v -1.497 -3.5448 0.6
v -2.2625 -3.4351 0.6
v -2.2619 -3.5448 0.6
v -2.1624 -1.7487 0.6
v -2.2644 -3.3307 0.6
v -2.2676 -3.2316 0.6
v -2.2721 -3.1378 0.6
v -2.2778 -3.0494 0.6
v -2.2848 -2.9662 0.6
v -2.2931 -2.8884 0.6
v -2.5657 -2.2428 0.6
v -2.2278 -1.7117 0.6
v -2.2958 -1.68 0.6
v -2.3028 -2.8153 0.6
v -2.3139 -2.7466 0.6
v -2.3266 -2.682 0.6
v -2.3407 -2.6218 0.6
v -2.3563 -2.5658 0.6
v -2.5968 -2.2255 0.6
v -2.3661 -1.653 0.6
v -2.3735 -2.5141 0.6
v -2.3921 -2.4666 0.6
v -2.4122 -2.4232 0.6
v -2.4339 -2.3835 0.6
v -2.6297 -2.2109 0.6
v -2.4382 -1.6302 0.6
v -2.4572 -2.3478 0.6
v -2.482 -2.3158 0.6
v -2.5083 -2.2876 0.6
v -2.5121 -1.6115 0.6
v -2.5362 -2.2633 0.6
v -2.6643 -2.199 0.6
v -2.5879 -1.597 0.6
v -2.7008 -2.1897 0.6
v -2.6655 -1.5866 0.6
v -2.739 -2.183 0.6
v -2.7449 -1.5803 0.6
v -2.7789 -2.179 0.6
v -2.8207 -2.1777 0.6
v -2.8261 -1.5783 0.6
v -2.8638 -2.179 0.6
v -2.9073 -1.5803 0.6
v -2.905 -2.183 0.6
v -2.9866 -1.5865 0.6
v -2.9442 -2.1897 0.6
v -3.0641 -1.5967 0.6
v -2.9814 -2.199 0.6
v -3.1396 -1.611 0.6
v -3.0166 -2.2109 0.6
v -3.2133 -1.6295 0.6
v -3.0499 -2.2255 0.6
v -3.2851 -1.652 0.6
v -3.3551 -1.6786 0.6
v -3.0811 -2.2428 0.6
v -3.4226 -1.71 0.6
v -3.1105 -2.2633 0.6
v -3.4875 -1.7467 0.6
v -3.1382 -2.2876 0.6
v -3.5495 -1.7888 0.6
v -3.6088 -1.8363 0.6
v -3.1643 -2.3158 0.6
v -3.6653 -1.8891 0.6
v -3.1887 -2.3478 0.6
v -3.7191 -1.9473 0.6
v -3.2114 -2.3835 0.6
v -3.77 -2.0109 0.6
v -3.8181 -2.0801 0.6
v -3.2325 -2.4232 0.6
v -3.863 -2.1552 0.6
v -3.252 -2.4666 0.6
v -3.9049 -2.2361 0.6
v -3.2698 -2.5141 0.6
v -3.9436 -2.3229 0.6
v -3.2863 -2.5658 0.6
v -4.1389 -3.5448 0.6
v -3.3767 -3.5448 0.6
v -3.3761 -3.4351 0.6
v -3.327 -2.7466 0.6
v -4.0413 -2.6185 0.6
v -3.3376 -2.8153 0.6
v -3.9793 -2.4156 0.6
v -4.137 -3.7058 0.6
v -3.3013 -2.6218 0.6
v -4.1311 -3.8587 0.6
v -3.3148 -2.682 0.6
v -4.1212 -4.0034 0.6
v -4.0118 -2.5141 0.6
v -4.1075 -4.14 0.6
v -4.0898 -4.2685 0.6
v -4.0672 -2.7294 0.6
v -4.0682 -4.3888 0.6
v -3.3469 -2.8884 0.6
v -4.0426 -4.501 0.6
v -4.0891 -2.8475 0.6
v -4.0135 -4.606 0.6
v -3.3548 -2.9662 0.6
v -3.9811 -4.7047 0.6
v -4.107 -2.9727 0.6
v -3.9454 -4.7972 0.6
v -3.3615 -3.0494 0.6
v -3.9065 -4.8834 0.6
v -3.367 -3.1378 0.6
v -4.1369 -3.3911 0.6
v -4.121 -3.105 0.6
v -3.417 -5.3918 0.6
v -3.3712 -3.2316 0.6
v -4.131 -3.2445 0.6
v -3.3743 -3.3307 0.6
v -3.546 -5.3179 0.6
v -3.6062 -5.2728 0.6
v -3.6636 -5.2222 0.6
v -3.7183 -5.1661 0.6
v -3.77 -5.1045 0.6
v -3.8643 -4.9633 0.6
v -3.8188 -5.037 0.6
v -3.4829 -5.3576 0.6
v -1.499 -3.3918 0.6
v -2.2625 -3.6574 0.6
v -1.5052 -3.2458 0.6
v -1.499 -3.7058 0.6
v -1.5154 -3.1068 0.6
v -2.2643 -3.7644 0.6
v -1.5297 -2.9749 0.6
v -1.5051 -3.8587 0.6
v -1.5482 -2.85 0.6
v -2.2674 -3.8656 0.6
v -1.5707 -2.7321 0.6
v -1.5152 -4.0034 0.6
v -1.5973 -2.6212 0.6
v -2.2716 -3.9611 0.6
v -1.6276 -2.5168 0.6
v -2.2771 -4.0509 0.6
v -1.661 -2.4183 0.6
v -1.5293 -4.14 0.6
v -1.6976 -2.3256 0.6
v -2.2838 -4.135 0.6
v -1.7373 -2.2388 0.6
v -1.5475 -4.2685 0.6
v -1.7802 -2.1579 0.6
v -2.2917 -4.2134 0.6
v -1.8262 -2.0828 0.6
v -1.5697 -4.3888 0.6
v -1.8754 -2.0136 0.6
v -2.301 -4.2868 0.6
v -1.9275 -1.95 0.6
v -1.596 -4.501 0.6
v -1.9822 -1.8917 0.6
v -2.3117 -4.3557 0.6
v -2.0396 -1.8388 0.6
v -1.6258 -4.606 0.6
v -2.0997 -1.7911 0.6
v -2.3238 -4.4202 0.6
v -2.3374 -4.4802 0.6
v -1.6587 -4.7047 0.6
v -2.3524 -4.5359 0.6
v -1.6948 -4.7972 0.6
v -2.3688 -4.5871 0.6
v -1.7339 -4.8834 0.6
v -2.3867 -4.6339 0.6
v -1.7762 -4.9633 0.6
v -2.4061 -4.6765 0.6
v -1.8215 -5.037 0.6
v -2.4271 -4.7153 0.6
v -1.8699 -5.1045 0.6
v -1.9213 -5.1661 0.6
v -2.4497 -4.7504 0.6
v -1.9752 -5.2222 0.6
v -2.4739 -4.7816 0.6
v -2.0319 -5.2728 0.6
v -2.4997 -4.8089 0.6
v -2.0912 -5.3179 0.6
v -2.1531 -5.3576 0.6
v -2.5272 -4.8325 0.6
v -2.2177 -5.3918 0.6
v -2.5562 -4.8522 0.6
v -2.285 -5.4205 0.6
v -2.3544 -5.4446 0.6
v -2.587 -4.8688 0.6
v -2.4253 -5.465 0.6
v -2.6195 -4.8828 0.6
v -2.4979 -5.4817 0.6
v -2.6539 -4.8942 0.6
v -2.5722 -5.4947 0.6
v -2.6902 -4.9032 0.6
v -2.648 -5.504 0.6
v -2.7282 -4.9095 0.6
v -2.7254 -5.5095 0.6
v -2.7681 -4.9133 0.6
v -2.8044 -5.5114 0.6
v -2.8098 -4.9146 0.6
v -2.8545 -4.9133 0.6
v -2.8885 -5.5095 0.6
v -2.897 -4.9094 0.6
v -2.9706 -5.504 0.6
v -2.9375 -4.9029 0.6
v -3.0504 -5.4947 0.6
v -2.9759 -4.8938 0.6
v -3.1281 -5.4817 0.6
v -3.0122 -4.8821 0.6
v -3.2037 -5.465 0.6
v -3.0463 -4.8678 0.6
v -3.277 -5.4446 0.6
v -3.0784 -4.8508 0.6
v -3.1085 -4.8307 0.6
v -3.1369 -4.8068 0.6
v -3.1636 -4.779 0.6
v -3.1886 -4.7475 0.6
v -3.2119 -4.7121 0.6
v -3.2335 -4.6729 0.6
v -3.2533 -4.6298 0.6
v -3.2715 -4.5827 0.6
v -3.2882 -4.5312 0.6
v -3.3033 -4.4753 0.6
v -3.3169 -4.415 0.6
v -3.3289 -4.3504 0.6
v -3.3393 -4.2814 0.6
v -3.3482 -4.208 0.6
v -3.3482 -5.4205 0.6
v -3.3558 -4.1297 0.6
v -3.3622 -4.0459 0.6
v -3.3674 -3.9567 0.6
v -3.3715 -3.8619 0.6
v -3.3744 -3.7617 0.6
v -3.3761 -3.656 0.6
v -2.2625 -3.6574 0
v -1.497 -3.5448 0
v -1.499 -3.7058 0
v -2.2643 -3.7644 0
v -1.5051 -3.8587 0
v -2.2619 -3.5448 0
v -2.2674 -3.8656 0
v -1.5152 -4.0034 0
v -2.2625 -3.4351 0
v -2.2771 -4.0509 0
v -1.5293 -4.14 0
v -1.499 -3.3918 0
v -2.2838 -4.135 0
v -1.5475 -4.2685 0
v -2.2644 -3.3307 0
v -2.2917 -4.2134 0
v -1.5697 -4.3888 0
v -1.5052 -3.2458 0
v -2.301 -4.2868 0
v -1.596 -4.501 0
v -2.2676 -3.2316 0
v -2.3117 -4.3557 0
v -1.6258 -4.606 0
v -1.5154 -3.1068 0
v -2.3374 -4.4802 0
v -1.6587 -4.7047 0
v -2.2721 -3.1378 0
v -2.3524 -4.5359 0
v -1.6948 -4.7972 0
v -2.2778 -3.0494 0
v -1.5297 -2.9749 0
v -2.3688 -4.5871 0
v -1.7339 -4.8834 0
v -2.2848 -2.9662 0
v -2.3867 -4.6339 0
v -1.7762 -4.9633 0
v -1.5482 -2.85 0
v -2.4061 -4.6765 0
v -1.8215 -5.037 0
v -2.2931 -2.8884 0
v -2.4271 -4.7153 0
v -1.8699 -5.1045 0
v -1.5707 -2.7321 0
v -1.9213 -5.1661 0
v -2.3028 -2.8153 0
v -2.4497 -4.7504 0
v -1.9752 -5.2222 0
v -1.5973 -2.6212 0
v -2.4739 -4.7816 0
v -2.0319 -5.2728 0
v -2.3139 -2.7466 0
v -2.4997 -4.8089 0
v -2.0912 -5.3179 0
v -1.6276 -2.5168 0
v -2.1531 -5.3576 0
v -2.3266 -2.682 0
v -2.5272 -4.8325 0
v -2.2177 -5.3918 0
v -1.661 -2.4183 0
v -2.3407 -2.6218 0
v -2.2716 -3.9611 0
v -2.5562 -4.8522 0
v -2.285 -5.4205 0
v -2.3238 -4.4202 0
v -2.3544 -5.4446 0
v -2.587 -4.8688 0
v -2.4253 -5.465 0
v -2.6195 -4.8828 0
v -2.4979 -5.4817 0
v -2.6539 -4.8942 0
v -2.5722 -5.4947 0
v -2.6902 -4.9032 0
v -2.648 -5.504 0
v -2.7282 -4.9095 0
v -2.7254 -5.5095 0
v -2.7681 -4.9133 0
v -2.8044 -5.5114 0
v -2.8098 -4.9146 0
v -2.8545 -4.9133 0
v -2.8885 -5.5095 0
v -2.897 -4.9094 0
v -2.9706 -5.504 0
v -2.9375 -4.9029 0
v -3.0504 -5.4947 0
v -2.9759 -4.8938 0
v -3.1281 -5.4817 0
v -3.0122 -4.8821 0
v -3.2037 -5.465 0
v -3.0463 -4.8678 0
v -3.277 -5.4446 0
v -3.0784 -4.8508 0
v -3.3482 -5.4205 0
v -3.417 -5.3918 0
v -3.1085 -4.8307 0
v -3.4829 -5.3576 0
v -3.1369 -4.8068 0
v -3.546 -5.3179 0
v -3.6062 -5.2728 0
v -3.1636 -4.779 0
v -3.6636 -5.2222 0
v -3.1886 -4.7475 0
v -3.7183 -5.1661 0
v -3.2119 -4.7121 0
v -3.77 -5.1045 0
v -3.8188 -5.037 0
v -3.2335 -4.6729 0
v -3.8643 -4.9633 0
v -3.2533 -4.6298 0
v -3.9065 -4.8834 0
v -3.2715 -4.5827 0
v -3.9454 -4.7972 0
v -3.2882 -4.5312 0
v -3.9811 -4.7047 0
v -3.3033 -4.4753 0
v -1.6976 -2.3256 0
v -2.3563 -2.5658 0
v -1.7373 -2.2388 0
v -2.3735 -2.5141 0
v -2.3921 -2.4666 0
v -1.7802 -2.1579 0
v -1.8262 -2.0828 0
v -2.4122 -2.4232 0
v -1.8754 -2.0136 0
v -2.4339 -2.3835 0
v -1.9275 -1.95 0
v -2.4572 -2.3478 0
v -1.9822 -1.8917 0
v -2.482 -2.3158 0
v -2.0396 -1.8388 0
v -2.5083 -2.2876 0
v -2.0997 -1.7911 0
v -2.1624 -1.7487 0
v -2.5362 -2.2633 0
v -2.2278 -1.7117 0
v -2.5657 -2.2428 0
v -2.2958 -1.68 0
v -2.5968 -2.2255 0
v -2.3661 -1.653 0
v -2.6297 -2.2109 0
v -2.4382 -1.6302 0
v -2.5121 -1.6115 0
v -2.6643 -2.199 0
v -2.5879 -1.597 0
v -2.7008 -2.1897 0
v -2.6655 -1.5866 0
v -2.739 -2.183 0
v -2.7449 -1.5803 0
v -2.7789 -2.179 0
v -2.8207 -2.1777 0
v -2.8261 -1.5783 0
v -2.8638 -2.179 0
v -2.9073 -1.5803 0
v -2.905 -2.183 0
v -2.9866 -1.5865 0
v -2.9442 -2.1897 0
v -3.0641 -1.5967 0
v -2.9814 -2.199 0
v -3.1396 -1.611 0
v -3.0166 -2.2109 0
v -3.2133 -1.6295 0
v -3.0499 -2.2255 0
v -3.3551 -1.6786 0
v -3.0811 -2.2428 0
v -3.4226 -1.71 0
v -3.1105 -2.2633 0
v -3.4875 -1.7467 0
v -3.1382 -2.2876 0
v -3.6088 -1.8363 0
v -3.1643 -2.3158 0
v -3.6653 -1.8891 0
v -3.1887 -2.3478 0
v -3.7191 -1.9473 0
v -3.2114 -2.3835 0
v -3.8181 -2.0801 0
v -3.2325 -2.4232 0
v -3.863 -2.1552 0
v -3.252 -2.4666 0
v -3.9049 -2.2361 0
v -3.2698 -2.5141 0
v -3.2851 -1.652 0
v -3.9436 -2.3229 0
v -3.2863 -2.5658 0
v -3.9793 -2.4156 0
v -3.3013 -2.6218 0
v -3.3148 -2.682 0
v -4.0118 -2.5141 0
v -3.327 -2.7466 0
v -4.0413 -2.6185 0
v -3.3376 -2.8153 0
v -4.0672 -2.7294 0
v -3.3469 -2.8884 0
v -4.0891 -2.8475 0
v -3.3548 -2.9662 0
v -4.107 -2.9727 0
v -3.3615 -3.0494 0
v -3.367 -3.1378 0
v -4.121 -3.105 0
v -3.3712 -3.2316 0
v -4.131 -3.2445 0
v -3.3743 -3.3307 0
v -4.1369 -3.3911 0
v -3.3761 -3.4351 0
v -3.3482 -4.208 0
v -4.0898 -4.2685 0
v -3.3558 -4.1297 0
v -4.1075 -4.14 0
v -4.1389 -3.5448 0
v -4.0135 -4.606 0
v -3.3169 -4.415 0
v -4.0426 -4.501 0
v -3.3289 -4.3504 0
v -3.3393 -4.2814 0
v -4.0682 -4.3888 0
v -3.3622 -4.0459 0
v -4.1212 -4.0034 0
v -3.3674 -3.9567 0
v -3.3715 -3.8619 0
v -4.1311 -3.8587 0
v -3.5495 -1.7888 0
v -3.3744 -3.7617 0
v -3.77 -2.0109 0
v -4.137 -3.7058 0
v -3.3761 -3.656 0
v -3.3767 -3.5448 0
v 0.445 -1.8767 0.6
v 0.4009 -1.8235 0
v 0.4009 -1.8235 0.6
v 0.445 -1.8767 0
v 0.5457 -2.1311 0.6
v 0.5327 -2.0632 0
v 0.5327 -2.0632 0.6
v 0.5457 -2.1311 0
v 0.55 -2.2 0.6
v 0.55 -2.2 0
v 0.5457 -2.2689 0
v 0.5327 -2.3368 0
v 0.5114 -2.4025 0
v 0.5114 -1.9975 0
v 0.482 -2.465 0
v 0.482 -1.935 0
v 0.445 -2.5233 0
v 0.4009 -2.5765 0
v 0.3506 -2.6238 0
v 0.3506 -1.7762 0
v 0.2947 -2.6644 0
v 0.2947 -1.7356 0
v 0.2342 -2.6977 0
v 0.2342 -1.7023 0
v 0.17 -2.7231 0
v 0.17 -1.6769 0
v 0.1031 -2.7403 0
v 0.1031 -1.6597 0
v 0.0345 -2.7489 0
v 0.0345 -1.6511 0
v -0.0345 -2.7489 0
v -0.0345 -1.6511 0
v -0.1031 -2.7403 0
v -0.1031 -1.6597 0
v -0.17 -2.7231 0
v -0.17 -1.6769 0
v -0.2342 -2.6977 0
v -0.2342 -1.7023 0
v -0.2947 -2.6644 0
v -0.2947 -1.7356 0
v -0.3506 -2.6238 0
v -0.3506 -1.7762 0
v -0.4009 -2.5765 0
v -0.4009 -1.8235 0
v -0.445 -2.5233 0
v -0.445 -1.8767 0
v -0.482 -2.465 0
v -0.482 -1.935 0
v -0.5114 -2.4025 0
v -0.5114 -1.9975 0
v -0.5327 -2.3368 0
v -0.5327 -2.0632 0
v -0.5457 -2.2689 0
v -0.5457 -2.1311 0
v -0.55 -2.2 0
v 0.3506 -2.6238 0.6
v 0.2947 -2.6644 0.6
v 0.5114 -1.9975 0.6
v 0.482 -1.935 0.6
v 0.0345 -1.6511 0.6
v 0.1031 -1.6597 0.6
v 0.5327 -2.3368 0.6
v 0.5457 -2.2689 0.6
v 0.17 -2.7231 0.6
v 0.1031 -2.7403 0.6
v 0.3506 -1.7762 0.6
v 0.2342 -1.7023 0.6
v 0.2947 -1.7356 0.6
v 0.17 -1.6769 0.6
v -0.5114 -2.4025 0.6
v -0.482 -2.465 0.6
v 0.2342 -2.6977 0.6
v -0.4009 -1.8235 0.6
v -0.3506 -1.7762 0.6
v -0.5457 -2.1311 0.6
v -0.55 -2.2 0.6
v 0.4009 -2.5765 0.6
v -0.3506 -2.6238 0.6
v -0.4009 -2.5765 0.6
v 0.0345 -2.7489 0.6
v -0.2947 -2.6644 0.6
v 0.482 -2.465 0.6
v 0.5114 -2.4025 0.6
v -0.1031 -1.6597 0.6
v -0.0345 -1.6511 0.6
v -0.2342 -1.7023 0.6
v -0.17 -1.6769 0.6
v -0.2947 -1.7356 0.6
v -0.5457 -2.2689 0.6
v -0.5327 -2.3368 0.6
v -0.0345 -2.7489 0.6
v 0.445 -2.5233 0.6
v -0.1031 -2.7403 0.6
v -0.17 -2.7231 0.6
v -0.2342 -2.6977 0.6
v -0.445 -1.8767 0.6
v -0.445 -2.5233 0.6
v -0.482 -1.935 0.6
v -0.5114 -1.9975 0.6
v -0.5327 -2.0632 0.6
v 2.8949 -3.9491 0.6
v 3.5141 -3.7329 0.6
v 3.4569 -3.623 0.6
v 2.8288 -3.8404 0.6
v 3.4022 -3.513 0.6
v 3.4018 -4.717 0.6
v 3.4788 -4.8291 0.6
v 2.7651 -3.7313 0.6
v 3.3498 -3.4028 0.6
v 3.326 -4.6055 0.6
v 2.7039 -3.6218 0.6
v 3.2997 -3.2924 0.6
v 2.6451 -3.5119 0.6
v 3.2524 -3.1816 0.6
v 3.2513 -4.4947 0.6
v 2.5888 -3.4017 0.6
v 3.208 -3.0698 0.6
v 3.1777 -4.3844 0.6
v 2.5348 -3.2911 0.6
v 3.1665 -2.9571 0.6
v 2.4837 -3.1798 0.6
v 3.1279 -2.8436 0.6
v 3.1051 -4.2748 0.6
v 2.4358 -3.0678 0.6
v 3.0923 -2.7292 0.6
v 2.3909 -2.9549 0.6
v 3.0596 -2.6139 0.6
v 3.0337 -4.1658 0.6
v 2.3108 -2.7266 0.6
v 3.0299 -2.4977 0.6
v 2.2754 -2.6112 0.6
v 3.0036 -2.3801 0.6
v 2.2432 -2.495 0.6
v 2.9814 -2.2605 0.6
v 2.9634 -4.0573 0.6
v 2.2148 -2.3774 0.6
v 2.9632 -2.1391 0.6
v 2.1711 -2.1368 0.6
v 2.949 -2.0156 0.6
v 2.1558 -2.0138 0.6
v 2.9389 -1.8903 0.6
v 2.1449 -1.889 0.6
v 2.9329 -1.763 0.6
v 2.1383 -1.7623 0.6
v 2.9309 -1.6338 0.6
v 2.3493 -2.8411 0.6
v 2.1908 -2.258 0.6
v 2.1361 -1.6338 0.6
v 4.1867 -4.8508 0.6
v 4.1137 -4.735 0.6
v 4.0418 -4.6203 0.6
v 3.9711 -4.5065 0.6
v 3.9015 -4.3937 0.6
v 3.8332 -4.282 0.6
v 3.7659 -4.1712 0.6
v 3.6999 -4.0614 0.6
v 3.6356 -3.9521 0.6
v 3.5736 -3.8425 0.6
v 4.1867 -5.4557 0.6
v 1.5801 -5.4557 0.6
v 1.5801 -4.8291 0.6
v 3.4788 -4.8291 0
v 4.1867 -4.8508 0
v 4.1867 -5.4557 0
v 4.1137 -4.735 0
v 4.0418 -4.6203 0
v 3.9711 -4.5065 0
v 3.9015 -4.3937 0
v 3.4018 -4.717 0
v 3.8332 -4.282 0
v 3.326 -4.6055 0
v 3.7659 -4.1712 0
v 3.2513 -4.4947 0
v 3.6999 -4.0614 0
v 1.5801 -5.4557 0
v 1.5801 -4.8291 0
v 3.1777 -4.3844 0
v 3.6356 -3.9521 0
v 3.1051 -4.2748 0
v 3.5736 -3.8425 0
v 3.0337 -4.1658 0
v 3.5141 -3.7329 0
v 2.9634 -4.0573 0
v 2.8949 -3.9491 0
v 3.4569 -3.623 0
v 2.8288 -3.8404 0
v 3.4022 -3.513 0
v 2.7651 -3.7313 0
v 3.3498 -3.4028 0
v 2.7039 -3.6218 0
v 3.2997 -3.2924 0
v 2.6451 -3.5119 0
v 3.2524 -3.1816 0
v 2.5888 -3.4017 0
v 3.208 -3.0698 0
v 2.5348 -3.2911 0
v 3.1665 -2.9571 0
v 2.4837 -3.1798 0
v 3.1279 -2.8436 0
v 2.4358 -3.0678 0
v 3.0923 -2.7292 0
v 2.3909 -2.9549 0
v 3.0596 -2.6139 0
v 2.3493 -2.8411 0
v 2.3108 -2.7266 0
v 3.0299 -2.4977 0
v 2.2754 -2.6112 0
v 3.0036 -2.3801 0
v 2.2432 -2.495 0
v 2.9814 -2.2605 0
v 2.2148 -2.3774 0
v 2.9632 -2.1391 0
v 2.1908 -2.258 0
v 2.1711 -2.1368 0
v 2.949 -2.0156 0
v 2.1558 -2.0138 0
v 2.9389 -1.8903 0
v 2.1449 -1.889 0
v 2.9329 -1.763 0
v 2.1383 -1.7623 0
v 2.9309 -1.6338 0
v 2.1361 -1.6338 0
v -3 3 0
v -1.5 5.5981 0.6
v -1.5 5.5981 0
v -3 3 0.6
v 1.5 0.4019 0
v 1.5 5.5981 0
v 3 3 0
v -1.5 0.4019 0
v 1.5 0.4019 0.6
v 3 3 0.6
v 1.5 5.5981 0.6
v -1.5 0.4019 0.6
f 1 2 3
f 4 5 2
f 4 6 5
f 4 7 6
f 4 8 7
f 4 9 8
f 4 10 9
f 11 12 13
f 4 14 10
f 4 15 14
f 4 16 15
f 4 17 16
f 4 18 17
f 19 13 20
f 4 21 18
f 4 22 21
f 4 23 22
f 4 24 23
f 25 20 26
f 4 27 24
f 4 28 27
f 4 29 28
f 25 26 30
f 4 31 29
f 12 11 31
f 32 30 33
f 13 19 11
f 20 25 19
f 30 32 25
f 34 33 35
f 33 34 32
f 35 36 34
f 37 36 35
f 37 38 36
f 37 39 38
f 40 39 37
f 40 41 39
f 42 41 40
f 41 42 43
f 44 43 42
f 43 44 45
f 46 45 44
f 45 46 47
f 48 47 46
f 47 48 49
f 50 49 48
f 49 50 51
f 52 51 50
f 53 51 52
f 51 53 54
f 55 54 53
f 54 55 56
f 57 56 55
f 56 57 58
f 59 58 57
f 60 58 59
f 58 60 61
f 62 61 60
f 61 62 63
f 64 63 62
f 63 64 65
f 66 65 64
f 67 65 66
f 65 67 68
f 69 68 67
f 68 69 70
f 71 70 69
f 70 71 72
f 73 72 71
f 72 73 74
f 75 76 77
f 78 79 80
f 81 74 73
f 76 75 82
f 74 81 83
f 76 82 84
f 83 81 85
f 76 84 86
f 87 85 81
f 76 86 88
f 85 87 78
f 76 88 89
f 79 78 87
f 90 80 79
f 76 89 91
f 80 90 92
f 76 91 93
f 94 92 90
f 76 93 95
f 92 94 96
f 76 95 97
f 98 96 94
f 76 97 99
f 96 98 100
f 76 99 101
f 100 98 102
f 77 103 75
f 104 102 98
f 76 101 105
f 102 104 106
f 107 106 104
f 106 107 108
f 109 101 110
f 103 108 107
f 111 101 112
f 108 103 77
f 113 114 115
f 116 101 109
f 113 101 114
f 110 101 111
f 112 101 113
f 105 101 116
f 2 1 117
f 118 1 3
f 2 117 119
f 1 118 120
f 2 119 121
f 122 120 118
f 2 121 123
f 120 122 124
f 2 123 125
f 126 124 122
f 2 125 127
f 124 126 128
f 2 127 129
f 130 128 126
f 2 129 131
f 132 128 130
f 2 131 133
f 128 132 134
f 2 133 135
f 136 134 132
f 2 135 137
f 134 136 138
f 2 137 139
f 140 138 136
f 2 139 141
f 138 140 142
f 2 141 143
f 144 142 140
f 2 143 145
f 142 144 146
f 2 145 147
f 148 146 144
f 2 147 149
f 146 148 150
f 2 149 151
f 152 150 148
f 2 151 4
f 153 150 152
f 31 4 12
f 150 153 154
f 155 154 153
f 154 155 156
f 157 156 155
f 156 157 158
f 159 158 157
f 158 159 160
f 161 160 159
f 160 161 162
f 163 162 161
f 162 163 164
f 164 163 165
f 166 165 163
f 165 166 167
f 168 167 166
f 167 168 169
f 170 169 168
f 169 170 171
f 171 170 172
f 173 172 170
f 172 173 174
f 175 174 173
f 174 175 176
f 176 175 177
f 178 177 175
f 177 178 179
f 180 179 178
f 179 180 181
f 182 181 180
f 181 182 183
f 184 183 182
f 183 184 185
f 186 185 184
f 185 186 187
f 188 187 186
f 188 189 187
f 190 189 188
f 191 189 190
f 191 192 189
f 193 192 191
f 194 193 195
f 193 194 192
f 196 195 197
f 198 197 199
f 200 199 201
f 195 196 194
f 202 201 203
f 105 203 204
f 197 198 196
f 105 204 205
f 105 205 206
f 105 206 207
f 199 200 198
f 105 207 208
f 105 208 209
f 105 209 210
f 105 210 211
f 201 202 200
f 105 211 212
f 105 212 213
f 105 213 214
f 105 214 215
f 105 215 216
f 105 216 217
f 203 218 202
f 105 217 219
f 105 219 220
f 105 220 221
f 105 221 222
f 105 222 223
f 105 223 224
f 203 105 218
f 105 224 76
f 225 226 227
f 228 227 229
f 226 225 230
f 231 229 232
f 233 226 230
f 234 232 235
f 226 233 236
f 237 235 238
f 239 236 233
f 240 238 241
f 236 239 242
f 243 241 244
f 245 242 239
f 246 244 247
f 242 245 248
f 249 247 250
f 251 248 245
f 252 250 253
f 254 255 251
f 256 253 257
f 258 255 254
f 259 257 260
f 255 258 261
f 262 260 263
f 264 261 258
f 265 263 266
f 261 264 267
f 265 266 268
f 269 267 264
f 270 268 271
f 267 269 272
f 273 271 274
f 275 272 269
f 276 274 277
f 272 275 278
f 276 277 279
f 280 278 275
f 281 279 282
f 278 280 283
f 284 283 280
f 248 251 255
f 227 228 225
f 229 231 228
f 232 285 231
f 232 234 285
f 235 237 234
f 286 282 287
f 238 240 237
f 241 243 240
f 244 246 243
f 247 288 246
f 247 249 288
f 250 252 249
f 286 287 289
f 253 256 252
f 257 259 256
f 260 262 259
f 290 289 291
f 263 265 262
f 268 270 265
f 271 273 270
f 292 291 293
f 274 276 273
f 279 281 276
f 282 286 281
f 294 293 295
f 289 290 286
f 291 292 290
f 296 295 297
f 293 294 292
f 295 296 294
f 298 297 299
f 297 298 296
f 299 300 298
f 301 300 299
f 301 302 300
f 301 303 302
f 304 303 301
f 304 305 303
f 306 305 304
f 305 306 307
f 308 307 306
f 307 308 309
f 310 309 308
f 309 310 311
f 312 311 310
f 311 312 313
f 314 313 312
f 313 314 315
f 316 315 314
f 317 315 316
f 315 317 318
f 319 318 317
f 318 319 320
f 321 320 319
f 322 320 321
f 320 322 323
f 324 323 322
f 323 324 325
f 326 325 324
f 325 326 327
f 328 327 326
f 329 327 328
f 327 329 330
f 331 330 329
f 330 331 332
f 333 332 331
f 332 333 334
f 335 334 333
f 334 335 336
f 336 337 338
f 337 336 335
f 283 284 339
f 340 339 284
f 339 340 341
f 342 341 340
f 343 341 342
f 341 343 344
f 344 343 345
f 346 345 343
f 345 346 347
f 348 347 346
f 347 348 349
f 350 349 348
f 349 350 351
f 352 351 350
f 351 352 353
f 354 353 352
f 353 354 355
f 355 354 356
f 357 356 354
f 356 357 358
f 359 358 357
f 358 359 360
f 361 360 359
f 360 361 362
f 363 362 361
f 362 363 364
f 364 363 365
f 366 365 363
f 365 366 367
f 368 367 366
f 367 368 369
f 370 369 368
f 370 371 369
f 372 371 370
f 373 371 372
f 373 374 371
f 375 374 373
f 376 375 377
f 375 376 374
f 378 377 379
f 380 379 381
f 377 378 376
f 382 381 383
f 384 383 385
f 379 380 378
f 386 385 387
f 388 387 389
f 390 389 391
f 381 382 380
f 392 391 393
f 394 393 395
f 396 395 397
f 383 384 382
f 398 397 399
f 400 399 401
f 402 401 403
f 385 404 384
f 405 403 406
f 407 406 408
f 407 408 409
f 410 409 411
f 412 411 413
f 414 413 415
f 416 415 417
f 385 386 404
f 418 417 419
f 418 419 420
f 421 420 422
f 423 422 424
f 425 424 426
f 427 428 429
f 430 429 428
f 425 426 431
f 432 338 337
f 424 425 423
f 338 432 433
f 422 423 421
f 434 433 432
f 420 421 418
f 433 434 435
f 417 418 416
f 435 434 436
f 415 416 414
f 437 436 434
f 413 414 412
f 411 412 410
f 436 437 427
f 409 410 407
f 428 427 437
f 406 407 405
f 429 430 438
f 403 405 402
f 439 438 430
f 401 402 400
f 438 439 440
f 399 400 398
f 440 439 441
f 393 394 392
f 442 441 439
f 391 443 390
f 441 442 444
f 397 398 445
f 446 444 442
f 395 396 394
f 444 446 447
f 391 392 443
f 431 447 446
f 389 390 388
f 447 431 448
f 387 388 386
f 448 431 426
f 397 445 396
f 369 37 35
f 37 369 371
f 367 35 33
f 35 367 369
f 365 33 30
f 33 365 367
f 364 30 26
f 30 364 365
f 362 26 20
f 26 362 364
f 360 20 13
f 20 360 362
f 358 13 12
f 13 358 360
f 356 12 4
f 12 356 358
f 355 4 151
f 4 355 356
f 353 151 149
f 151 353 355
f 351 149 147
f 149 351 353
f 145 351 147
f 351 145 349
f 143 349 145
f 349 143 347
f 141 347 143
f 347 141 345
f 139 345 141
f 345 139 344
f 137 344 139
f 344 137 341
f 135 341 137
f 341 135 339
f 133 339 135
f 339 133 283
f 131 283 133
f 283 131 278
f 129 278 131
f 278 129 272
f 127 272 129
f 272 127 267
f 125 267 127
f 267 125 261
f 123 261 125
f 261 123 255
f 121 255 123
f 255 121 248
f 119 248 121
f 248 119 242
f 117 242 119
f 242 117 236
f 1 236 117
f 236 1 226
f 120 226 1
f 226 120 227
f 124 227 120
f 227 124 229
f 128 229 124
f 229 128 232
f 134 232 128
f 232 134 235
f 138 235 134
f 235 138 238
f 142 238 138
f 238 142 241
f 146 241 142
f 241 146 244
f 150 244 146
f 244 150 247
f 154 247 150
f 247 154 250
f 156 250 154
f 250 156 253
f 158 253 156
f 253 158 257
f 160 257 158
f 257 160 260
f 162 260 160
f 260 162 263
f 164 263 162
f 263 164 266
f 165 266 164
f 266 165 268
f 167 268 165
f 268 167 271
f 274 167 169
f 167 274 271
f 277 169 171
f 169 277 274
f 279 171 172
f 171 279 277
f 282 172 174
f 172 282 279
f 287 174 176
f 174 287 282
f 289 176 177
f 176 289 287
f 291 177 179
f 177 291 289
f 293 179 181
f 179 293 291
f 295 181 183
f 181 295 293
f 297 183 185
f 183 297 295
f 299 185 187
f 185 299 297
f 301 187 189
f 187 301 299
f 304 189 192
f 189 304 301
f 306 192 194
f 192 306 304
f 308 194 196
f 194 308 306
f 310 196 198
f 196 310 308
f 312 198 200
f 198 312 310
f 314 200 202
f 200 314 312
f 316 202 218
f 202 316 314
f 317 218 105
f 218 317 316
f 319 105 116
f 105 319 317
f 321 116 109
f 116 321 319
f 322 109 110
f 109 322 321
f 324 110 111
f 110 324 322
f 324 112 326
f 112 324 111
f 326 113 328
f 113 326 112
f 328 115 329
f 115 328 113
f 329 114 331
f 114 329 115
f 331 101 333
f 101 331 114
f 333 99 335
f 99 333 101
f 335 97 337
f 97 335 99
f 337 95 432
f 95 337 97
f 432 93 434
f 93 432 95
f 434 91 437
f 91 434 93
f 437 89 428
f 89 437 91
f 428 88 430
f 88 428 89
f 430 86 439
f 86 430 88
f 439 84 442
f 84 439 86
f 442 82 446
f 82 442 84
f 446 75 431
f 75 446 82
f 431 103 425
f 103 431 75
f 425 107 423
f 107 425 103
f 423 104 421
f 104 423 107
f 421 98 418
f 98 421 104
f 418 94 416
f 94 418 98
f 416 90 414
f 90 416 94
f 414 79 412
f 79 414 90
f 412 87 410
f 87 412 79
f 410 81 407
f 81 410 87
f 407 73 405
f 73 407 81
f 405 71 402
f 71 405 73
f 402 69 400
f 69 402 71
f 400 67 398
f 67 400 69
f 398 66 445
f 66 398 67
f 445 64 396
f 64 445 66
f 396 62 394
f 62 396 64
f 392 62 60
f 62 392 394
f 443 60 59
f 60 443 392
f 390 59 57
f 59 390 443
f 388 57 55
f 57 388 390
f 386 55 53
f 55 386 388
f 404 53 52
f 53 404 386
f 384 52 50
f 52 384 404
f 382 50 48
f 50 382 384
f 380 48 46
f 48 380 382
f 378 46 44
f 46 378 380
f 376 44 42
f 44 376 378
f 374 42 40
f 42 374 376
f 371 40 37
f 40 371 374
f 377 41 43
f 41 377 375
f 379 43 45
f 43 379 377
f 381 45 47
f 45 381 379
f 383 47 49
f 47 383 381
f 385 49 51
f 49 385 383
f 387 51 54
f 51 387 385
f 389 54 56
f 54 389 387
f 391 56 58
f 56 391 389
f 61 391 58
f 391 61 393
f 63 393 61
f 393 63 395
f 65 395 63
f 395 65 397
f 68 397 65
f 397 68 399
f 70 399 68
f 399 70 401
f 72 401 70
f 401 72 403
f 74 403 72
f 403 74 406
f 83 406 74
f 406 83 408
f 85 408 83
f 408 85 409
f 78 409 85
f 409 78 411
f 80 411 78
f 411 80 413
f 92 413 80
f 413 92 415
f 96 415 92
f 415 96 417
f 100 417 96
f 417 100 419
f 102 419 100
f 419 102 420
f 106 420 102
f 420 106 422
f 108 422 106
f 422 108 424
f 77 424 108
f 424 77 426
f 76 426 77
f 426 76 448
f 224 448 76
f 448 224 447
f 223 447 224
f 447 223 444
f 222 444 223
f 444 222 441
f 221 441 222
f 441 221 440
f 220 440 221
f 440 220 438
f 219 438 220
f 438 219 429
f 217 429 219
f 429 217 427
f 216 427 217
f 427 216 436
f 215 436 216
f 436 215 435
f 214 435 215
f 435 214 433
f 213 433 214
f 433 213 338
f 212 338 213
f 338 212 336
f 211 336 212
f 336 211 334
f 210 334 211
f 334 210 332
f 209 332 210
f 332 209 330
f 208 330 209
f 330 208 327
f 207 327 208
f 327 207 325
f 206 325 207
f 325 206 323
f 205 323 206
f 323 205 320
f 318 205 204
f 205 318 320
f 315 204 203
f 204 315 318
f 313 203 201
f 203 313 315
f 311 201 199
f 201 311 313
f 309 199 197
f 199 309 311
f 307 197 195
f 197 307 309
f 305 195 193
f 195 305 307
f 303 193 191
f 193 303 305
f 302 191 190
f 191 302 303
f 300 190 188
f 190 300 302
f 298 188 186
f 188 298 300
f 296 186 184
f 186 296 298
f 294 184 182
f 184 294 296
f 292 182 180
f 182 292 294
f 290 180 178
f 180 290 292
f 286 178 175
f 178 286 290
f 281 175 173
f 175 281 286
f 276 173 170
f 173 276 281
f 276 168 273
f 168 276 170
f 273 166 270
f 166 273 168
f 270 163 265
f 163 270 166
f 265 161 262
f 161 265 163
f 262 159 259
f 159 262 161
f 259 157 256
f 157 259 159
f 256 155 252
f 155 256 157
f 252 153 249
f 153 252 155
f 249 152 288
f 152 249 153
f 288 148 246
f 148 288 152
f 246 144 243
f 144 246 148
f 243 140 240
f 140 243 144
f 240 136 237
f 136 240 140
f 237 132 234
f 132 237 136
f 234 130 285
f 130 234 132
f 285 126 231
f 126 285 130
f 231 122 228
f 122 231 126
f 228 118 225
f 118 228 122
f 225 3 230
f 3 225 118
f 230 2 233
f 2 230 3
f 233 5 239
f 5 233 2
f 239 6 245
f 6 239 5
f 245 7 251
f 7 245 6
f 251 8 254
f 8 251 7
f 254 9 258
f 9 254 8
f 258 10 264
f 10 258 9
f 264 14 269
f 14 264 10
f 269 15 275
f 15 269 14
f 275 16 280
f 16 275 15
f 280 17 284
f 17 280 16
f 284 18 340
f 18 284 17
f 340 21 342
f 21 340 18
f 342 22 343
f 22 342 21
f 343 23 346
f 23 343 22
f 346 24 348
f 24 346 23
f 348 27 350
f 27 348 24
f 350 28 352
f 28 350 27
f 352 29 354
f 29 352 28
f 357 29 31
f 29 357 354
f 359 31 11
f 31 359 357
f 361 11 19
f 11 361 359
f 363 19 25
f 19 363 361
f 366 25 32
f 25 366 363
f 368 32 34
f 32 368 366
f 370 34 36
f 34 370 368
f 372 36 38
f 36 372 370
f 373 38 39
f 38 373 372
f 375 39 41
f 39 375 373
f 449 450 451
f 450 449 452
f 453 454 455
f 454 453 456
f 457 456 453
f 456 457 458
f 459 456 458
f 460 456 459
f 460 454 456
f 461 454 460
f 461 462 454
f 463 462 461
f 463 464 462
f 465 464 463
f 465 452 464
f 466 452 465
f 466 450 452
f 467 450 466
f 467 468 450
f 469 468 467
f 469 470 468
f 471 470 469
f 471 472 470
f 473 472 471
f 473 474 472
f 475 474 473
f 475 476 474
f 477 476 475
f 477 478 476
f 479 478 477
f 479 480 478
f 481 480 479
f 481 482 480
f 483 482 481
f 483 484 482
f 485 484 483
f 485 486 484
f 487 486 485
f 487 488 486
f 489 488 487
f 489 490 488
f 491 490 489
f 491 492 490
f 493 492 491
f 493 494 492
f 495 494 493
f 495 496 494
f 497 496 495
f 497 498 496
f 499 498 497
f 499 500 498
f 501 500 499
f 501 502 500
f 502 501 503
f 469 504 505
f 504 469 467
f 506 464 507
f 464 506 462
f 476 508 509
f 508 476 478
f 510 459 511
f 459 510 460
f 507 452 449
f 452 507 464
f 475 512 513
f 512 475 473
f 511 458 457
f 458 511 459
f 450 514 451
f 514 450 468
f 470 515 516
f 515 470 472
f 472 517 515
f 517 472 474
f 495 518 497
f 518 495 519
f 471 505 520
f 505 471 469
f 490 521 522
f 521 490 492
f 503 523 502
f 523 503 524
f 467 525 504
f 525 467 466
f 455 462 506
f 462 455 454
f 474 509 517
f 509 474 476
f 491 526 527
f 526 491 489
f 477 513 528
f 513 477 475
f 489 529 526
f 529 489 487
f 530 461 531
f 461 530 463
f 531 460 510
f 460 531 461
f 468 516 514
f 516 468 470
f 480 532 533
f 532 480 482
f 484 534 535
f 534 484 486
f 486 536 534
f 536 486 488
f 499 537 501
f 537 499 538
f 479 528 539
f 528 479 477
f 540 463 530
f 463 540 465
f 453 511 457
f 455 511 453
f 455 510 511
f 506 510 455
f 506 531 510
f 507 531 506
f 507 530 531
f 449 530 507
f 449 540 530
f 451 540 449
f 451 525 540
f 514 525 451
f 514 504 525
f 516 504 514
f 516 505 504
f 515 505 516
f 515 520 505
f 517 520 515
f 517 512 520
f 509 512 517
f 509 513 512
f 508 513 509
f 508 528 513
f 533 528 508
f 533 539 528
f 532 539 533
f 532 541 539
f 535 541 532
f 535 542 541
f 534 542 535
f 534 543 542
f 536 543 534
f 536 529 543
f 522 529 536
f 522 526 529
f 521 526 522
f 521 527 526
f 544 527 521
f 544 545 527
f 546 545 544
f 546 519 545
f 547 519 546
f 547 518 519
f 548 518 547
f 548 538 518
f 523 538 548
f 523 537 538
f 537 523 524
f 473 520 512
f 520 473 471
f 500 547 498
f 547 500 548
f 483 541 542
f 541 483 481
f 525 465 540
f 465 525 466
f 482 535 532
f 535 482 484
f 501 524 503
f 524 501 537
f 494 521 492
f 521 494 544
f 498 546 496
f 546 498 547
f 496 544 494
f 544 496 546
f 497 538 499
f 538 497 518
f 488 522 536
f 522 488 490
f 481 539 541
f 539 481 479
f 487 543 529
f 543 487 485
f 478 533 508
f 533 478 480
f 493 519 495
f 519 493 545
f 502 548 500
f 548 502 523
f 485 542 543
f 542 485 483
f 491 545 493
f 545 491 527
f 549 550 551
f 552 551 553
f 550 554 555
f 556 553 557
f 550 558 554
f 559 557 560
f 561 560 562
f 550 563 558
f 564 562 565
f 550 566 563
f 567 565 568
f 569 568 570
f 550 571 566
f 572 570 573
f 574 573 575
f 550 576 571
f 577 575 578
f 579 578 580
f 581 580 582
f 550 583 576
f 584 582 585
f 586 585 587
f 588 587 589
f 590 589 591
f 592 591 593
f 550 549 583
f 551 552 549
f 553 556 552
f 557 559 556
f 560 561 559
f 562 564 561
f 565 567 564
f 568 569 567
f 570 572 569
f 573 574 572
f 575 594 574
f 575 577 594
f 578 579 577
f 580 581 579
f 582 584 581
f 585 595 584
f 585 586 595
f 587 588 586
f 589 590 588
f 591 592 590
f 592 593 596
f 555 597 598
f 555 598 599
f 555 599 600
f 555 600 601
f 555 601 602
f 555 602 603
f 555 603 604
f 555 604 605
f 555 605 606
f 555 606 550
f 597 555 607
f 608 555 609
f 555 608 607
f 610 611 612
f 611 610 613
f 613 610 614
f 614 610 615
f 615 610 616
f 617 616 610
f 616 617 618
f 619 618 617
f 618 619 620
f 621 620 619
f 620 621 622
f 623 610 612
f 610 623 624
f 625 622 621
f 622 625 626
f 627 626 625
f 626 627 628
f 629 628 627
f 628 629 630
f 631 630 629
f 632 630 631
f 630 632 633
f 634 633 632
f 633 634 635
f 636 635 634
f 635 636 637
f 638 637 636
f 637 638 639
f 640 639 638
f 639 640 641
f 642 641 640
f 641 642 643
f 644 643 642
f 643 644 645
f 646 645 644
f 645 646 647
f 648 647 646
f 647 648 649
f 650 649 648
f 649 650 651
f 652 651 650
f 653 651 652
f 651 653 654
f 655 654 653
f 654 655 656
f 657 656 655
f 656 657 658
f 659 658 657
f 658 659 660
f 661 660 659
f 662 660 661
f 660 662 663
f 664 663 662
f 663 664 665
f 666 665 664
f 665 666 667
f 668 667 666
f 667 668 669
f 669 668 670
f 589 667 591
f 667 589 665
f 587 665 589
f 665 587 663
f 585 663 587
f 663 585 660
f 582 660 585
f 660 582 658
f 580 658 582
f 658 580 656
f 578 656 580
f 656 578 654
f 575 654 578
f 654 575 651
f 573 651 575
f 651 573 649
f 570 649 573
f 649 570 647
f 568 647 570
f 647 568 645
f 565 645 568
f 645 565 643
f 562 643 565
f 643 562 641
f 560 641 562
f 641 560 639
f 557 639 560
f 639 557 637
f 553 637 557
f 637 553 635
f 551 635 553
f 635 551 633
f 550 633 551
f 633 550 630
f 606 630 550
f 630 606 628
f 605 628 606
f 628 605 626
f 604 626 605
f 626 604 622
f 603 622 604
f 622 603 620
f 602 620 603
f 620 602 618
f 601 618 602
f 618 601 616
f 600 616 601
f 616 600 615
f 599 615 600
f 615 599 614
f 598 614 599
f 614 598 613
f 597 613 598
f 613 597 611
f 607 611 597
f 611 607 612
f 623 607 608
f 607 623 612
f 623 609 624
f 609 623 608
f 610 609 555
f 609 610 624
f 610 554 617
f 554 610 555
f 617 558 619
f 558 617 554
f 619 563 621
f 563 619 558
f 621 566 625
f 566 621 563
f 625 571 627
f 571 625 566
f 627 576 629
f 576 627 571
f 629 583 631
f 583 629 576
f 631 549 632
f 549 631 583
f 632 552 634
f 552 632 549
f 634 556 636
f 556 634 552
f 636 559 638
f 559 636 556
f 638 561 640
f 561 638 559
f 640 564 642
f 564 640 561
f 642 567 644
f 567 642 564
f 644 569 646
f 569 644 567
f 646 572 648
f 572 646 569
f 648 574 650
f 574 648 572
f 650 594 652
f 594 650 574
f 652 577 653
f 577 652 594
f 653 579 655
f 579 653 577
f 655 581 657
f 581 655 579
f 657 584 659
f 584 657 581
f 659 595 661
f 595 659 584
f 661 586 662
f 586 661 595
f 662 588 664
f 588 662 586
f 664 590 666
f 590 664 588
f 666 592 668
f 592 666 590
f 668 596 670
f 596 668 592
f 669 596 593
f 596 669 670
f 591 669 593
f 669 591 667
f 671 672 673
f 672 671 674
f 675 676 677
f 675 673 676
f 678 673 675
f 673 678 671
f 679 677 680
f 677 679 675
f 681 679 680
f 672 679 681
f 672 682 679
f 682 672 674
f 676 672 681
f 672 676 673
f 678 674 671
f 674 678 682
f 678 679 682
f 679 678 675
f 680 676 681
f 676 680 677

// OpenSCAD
$fn = 50;

difference() {
	union() {
		translate(v = [-2.85, -3.5, 0.6]) {
			rotate(a = [180, 0, 0]) {
				linear_extrude(height = 0.6) {
					text(font = "Liberation Sans:style=Bold", halign = "center", size = 4.0, text = "0", valign = "center");
				}
			}
		}
		translate(v = [0.0, -2.2, 0.0]) {
			cylinder(h = 0.6, r = 0.55);
		}
		translate(v = [2.85, -3.5, 0.6]) {
			rotate(a = [180, 0, 0]) {
				linear_extrude(height = 0.6) {
					text(font = "Liberation Sans:style=Bold", halign = "center", size = 4.0, text = "7", valign = "center");
				}
			}
		}
		translate(v = [0, 3, 0]) {
			linear_extrude(height = 0.6) {
				polygon(points = [[3.0, 0.0], [1.5000000000000004, 2.598076211353316], [-1.4999999999999993, 2.598076211353316], [-3.0, 3.6739403974420594e-16], [-1.5000000000000013, -2.5980762113533156], [1.499999999999998, -2.598076211353317]]);
			}
		}
	}
	union();
}
